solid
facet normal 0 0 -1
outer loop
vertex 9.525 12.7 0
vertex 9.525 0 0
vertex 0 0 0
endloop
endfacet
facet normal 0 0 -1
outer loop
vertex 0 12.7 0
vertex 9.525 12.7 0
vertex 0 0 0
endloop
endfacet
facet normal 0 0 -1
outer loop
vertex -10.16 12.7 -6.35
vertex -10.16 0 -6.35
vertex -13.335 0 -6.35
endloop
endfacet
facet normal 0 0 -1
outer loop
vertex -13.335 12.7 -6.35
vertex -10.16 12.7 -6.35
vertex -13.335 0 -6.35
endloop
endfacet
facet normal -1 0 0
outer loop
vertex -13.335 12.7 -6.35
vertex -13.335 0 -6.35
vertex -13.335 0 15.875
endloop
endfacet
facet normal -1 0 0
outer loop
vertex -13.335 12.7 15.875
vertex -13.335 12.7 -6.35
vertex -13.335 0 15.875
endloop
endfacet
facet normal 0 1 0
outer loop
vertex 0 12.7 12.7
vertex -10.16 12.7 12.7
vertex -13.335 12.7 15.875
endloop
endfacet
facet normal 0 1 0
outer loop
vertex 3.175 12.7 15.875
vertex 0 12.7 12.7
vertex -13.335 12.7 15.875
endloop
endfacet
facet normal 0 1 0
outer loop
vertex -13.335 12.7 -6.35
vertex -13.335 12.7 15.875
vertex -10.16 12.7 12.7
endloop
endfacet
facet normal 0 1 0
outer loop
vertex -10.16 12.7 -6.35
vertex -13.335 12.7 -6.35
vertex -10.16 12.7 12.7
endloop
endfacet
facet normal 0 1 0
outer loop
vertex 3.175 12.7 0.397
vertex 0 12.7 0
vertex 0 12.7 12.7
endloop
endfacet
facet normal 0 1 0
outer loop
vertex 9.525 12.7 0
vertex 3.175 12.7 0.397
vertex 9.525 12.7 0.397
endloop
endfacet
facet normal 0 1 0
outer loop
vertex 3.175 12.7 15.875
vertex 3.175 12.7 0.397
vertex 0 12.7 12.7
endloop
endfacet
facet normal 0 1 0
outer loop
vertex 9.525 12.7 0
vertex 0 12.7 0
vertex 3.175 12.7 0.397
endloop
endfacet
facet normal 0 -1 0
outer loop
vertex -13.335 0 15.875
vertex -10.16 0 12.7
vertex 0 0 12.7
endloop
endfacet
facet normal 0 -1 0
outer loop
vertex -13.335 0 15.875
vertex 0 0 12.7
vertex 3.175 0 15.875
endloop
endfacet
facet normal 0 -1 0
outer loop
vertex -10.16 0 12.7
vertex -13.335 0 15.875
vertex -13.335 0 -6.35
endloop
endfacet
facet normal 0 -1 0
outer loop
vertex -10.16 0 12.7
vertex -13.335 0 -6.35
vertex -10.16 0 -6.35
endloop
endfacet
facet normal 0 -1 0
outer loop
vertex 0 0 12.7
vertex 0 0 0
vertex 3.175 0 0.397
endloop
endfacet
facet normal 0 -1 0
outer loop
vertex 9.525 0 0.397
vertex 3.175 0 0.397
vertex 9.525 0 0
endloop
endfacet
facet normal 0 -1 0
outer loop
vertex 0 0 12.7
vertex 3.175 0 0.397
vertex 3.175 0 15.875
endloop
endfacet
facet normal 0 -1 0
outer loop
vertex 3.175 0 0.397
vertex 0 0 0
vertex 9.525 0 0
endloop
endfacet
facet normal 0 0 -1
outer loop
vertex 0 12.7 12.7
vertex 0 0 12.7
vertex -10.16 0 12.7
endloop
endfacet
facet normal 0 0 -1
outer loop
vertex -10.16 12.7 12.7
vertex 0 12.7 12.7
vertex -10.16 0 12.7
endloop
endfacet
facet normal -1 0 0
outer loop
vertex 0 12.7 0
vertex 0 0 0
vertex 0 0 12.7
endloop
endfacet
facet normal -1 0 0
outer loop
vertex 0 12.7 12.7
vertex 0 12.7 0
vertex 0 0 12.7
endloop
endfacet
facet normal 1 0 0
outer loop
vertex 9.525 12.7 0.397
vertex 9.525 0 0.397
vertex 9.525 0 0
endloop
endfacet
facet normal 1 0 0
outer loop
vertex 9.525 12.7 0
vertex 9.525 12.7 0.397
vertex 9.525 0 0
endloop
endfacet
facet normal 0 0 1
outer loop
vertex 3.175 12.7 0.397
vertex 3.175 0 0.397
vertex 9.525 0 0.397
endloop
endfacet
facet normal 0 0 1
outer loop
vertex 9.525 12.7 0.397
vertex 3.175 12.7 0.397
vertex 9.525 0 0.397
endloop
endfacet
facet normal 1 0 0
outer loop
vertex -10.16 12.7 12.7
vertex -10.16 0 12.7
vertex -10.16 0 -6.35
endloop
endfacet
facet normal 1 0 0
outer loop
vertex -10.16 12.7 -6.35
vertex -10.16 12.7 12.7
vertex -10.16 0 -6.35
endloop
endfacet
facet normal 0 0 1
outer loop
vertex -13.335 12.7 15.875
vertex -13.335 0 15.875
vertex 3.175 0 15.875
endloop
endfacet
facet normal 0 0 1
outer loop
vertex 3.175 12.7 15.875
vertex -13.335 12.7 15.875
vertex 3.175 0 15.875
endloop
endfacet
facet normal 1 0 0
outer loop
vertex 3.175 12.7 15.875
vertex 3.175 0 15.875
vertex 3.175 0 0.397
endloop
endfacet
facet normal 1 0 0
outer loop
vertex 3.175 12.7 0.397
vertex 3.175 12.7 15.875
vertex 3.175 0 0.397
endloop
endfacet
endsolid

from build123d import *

# Parameters (mm, degrees)
SKETCH1_W           = 6.35
SKETCH1_H           = 0.396875
BOSS_EXTRUDE1_DEPTH = 12.7


with BuildPart() as part:
    # Sketch1 → Boss-Extrude1 (new body)
    with BuildSketch(Plane(origin=(0, 0, 0), x_dir=(1, 0, 0), z_dir=(0, 1, 0))):
        Polygon((-13.335, 6.35), (-13.335, -15.875), (0, -15.875), (0, -12.7), (-10.16, -12.7), (-10.16, 6.35), align=None)
        Polygon((0, -12.7), (0, -15.875), (3.175, -15.875), (3.175, -0.396875), (3.175, 0), (0, 0), align=None)
        with Locations((6.35, -0.1984375)):
            Rectangle(SKETCH1_W, SKETCH1_H)
    extrude(amount=BOSS_EXTRUDE1_DEPTH)


solid = part.part
